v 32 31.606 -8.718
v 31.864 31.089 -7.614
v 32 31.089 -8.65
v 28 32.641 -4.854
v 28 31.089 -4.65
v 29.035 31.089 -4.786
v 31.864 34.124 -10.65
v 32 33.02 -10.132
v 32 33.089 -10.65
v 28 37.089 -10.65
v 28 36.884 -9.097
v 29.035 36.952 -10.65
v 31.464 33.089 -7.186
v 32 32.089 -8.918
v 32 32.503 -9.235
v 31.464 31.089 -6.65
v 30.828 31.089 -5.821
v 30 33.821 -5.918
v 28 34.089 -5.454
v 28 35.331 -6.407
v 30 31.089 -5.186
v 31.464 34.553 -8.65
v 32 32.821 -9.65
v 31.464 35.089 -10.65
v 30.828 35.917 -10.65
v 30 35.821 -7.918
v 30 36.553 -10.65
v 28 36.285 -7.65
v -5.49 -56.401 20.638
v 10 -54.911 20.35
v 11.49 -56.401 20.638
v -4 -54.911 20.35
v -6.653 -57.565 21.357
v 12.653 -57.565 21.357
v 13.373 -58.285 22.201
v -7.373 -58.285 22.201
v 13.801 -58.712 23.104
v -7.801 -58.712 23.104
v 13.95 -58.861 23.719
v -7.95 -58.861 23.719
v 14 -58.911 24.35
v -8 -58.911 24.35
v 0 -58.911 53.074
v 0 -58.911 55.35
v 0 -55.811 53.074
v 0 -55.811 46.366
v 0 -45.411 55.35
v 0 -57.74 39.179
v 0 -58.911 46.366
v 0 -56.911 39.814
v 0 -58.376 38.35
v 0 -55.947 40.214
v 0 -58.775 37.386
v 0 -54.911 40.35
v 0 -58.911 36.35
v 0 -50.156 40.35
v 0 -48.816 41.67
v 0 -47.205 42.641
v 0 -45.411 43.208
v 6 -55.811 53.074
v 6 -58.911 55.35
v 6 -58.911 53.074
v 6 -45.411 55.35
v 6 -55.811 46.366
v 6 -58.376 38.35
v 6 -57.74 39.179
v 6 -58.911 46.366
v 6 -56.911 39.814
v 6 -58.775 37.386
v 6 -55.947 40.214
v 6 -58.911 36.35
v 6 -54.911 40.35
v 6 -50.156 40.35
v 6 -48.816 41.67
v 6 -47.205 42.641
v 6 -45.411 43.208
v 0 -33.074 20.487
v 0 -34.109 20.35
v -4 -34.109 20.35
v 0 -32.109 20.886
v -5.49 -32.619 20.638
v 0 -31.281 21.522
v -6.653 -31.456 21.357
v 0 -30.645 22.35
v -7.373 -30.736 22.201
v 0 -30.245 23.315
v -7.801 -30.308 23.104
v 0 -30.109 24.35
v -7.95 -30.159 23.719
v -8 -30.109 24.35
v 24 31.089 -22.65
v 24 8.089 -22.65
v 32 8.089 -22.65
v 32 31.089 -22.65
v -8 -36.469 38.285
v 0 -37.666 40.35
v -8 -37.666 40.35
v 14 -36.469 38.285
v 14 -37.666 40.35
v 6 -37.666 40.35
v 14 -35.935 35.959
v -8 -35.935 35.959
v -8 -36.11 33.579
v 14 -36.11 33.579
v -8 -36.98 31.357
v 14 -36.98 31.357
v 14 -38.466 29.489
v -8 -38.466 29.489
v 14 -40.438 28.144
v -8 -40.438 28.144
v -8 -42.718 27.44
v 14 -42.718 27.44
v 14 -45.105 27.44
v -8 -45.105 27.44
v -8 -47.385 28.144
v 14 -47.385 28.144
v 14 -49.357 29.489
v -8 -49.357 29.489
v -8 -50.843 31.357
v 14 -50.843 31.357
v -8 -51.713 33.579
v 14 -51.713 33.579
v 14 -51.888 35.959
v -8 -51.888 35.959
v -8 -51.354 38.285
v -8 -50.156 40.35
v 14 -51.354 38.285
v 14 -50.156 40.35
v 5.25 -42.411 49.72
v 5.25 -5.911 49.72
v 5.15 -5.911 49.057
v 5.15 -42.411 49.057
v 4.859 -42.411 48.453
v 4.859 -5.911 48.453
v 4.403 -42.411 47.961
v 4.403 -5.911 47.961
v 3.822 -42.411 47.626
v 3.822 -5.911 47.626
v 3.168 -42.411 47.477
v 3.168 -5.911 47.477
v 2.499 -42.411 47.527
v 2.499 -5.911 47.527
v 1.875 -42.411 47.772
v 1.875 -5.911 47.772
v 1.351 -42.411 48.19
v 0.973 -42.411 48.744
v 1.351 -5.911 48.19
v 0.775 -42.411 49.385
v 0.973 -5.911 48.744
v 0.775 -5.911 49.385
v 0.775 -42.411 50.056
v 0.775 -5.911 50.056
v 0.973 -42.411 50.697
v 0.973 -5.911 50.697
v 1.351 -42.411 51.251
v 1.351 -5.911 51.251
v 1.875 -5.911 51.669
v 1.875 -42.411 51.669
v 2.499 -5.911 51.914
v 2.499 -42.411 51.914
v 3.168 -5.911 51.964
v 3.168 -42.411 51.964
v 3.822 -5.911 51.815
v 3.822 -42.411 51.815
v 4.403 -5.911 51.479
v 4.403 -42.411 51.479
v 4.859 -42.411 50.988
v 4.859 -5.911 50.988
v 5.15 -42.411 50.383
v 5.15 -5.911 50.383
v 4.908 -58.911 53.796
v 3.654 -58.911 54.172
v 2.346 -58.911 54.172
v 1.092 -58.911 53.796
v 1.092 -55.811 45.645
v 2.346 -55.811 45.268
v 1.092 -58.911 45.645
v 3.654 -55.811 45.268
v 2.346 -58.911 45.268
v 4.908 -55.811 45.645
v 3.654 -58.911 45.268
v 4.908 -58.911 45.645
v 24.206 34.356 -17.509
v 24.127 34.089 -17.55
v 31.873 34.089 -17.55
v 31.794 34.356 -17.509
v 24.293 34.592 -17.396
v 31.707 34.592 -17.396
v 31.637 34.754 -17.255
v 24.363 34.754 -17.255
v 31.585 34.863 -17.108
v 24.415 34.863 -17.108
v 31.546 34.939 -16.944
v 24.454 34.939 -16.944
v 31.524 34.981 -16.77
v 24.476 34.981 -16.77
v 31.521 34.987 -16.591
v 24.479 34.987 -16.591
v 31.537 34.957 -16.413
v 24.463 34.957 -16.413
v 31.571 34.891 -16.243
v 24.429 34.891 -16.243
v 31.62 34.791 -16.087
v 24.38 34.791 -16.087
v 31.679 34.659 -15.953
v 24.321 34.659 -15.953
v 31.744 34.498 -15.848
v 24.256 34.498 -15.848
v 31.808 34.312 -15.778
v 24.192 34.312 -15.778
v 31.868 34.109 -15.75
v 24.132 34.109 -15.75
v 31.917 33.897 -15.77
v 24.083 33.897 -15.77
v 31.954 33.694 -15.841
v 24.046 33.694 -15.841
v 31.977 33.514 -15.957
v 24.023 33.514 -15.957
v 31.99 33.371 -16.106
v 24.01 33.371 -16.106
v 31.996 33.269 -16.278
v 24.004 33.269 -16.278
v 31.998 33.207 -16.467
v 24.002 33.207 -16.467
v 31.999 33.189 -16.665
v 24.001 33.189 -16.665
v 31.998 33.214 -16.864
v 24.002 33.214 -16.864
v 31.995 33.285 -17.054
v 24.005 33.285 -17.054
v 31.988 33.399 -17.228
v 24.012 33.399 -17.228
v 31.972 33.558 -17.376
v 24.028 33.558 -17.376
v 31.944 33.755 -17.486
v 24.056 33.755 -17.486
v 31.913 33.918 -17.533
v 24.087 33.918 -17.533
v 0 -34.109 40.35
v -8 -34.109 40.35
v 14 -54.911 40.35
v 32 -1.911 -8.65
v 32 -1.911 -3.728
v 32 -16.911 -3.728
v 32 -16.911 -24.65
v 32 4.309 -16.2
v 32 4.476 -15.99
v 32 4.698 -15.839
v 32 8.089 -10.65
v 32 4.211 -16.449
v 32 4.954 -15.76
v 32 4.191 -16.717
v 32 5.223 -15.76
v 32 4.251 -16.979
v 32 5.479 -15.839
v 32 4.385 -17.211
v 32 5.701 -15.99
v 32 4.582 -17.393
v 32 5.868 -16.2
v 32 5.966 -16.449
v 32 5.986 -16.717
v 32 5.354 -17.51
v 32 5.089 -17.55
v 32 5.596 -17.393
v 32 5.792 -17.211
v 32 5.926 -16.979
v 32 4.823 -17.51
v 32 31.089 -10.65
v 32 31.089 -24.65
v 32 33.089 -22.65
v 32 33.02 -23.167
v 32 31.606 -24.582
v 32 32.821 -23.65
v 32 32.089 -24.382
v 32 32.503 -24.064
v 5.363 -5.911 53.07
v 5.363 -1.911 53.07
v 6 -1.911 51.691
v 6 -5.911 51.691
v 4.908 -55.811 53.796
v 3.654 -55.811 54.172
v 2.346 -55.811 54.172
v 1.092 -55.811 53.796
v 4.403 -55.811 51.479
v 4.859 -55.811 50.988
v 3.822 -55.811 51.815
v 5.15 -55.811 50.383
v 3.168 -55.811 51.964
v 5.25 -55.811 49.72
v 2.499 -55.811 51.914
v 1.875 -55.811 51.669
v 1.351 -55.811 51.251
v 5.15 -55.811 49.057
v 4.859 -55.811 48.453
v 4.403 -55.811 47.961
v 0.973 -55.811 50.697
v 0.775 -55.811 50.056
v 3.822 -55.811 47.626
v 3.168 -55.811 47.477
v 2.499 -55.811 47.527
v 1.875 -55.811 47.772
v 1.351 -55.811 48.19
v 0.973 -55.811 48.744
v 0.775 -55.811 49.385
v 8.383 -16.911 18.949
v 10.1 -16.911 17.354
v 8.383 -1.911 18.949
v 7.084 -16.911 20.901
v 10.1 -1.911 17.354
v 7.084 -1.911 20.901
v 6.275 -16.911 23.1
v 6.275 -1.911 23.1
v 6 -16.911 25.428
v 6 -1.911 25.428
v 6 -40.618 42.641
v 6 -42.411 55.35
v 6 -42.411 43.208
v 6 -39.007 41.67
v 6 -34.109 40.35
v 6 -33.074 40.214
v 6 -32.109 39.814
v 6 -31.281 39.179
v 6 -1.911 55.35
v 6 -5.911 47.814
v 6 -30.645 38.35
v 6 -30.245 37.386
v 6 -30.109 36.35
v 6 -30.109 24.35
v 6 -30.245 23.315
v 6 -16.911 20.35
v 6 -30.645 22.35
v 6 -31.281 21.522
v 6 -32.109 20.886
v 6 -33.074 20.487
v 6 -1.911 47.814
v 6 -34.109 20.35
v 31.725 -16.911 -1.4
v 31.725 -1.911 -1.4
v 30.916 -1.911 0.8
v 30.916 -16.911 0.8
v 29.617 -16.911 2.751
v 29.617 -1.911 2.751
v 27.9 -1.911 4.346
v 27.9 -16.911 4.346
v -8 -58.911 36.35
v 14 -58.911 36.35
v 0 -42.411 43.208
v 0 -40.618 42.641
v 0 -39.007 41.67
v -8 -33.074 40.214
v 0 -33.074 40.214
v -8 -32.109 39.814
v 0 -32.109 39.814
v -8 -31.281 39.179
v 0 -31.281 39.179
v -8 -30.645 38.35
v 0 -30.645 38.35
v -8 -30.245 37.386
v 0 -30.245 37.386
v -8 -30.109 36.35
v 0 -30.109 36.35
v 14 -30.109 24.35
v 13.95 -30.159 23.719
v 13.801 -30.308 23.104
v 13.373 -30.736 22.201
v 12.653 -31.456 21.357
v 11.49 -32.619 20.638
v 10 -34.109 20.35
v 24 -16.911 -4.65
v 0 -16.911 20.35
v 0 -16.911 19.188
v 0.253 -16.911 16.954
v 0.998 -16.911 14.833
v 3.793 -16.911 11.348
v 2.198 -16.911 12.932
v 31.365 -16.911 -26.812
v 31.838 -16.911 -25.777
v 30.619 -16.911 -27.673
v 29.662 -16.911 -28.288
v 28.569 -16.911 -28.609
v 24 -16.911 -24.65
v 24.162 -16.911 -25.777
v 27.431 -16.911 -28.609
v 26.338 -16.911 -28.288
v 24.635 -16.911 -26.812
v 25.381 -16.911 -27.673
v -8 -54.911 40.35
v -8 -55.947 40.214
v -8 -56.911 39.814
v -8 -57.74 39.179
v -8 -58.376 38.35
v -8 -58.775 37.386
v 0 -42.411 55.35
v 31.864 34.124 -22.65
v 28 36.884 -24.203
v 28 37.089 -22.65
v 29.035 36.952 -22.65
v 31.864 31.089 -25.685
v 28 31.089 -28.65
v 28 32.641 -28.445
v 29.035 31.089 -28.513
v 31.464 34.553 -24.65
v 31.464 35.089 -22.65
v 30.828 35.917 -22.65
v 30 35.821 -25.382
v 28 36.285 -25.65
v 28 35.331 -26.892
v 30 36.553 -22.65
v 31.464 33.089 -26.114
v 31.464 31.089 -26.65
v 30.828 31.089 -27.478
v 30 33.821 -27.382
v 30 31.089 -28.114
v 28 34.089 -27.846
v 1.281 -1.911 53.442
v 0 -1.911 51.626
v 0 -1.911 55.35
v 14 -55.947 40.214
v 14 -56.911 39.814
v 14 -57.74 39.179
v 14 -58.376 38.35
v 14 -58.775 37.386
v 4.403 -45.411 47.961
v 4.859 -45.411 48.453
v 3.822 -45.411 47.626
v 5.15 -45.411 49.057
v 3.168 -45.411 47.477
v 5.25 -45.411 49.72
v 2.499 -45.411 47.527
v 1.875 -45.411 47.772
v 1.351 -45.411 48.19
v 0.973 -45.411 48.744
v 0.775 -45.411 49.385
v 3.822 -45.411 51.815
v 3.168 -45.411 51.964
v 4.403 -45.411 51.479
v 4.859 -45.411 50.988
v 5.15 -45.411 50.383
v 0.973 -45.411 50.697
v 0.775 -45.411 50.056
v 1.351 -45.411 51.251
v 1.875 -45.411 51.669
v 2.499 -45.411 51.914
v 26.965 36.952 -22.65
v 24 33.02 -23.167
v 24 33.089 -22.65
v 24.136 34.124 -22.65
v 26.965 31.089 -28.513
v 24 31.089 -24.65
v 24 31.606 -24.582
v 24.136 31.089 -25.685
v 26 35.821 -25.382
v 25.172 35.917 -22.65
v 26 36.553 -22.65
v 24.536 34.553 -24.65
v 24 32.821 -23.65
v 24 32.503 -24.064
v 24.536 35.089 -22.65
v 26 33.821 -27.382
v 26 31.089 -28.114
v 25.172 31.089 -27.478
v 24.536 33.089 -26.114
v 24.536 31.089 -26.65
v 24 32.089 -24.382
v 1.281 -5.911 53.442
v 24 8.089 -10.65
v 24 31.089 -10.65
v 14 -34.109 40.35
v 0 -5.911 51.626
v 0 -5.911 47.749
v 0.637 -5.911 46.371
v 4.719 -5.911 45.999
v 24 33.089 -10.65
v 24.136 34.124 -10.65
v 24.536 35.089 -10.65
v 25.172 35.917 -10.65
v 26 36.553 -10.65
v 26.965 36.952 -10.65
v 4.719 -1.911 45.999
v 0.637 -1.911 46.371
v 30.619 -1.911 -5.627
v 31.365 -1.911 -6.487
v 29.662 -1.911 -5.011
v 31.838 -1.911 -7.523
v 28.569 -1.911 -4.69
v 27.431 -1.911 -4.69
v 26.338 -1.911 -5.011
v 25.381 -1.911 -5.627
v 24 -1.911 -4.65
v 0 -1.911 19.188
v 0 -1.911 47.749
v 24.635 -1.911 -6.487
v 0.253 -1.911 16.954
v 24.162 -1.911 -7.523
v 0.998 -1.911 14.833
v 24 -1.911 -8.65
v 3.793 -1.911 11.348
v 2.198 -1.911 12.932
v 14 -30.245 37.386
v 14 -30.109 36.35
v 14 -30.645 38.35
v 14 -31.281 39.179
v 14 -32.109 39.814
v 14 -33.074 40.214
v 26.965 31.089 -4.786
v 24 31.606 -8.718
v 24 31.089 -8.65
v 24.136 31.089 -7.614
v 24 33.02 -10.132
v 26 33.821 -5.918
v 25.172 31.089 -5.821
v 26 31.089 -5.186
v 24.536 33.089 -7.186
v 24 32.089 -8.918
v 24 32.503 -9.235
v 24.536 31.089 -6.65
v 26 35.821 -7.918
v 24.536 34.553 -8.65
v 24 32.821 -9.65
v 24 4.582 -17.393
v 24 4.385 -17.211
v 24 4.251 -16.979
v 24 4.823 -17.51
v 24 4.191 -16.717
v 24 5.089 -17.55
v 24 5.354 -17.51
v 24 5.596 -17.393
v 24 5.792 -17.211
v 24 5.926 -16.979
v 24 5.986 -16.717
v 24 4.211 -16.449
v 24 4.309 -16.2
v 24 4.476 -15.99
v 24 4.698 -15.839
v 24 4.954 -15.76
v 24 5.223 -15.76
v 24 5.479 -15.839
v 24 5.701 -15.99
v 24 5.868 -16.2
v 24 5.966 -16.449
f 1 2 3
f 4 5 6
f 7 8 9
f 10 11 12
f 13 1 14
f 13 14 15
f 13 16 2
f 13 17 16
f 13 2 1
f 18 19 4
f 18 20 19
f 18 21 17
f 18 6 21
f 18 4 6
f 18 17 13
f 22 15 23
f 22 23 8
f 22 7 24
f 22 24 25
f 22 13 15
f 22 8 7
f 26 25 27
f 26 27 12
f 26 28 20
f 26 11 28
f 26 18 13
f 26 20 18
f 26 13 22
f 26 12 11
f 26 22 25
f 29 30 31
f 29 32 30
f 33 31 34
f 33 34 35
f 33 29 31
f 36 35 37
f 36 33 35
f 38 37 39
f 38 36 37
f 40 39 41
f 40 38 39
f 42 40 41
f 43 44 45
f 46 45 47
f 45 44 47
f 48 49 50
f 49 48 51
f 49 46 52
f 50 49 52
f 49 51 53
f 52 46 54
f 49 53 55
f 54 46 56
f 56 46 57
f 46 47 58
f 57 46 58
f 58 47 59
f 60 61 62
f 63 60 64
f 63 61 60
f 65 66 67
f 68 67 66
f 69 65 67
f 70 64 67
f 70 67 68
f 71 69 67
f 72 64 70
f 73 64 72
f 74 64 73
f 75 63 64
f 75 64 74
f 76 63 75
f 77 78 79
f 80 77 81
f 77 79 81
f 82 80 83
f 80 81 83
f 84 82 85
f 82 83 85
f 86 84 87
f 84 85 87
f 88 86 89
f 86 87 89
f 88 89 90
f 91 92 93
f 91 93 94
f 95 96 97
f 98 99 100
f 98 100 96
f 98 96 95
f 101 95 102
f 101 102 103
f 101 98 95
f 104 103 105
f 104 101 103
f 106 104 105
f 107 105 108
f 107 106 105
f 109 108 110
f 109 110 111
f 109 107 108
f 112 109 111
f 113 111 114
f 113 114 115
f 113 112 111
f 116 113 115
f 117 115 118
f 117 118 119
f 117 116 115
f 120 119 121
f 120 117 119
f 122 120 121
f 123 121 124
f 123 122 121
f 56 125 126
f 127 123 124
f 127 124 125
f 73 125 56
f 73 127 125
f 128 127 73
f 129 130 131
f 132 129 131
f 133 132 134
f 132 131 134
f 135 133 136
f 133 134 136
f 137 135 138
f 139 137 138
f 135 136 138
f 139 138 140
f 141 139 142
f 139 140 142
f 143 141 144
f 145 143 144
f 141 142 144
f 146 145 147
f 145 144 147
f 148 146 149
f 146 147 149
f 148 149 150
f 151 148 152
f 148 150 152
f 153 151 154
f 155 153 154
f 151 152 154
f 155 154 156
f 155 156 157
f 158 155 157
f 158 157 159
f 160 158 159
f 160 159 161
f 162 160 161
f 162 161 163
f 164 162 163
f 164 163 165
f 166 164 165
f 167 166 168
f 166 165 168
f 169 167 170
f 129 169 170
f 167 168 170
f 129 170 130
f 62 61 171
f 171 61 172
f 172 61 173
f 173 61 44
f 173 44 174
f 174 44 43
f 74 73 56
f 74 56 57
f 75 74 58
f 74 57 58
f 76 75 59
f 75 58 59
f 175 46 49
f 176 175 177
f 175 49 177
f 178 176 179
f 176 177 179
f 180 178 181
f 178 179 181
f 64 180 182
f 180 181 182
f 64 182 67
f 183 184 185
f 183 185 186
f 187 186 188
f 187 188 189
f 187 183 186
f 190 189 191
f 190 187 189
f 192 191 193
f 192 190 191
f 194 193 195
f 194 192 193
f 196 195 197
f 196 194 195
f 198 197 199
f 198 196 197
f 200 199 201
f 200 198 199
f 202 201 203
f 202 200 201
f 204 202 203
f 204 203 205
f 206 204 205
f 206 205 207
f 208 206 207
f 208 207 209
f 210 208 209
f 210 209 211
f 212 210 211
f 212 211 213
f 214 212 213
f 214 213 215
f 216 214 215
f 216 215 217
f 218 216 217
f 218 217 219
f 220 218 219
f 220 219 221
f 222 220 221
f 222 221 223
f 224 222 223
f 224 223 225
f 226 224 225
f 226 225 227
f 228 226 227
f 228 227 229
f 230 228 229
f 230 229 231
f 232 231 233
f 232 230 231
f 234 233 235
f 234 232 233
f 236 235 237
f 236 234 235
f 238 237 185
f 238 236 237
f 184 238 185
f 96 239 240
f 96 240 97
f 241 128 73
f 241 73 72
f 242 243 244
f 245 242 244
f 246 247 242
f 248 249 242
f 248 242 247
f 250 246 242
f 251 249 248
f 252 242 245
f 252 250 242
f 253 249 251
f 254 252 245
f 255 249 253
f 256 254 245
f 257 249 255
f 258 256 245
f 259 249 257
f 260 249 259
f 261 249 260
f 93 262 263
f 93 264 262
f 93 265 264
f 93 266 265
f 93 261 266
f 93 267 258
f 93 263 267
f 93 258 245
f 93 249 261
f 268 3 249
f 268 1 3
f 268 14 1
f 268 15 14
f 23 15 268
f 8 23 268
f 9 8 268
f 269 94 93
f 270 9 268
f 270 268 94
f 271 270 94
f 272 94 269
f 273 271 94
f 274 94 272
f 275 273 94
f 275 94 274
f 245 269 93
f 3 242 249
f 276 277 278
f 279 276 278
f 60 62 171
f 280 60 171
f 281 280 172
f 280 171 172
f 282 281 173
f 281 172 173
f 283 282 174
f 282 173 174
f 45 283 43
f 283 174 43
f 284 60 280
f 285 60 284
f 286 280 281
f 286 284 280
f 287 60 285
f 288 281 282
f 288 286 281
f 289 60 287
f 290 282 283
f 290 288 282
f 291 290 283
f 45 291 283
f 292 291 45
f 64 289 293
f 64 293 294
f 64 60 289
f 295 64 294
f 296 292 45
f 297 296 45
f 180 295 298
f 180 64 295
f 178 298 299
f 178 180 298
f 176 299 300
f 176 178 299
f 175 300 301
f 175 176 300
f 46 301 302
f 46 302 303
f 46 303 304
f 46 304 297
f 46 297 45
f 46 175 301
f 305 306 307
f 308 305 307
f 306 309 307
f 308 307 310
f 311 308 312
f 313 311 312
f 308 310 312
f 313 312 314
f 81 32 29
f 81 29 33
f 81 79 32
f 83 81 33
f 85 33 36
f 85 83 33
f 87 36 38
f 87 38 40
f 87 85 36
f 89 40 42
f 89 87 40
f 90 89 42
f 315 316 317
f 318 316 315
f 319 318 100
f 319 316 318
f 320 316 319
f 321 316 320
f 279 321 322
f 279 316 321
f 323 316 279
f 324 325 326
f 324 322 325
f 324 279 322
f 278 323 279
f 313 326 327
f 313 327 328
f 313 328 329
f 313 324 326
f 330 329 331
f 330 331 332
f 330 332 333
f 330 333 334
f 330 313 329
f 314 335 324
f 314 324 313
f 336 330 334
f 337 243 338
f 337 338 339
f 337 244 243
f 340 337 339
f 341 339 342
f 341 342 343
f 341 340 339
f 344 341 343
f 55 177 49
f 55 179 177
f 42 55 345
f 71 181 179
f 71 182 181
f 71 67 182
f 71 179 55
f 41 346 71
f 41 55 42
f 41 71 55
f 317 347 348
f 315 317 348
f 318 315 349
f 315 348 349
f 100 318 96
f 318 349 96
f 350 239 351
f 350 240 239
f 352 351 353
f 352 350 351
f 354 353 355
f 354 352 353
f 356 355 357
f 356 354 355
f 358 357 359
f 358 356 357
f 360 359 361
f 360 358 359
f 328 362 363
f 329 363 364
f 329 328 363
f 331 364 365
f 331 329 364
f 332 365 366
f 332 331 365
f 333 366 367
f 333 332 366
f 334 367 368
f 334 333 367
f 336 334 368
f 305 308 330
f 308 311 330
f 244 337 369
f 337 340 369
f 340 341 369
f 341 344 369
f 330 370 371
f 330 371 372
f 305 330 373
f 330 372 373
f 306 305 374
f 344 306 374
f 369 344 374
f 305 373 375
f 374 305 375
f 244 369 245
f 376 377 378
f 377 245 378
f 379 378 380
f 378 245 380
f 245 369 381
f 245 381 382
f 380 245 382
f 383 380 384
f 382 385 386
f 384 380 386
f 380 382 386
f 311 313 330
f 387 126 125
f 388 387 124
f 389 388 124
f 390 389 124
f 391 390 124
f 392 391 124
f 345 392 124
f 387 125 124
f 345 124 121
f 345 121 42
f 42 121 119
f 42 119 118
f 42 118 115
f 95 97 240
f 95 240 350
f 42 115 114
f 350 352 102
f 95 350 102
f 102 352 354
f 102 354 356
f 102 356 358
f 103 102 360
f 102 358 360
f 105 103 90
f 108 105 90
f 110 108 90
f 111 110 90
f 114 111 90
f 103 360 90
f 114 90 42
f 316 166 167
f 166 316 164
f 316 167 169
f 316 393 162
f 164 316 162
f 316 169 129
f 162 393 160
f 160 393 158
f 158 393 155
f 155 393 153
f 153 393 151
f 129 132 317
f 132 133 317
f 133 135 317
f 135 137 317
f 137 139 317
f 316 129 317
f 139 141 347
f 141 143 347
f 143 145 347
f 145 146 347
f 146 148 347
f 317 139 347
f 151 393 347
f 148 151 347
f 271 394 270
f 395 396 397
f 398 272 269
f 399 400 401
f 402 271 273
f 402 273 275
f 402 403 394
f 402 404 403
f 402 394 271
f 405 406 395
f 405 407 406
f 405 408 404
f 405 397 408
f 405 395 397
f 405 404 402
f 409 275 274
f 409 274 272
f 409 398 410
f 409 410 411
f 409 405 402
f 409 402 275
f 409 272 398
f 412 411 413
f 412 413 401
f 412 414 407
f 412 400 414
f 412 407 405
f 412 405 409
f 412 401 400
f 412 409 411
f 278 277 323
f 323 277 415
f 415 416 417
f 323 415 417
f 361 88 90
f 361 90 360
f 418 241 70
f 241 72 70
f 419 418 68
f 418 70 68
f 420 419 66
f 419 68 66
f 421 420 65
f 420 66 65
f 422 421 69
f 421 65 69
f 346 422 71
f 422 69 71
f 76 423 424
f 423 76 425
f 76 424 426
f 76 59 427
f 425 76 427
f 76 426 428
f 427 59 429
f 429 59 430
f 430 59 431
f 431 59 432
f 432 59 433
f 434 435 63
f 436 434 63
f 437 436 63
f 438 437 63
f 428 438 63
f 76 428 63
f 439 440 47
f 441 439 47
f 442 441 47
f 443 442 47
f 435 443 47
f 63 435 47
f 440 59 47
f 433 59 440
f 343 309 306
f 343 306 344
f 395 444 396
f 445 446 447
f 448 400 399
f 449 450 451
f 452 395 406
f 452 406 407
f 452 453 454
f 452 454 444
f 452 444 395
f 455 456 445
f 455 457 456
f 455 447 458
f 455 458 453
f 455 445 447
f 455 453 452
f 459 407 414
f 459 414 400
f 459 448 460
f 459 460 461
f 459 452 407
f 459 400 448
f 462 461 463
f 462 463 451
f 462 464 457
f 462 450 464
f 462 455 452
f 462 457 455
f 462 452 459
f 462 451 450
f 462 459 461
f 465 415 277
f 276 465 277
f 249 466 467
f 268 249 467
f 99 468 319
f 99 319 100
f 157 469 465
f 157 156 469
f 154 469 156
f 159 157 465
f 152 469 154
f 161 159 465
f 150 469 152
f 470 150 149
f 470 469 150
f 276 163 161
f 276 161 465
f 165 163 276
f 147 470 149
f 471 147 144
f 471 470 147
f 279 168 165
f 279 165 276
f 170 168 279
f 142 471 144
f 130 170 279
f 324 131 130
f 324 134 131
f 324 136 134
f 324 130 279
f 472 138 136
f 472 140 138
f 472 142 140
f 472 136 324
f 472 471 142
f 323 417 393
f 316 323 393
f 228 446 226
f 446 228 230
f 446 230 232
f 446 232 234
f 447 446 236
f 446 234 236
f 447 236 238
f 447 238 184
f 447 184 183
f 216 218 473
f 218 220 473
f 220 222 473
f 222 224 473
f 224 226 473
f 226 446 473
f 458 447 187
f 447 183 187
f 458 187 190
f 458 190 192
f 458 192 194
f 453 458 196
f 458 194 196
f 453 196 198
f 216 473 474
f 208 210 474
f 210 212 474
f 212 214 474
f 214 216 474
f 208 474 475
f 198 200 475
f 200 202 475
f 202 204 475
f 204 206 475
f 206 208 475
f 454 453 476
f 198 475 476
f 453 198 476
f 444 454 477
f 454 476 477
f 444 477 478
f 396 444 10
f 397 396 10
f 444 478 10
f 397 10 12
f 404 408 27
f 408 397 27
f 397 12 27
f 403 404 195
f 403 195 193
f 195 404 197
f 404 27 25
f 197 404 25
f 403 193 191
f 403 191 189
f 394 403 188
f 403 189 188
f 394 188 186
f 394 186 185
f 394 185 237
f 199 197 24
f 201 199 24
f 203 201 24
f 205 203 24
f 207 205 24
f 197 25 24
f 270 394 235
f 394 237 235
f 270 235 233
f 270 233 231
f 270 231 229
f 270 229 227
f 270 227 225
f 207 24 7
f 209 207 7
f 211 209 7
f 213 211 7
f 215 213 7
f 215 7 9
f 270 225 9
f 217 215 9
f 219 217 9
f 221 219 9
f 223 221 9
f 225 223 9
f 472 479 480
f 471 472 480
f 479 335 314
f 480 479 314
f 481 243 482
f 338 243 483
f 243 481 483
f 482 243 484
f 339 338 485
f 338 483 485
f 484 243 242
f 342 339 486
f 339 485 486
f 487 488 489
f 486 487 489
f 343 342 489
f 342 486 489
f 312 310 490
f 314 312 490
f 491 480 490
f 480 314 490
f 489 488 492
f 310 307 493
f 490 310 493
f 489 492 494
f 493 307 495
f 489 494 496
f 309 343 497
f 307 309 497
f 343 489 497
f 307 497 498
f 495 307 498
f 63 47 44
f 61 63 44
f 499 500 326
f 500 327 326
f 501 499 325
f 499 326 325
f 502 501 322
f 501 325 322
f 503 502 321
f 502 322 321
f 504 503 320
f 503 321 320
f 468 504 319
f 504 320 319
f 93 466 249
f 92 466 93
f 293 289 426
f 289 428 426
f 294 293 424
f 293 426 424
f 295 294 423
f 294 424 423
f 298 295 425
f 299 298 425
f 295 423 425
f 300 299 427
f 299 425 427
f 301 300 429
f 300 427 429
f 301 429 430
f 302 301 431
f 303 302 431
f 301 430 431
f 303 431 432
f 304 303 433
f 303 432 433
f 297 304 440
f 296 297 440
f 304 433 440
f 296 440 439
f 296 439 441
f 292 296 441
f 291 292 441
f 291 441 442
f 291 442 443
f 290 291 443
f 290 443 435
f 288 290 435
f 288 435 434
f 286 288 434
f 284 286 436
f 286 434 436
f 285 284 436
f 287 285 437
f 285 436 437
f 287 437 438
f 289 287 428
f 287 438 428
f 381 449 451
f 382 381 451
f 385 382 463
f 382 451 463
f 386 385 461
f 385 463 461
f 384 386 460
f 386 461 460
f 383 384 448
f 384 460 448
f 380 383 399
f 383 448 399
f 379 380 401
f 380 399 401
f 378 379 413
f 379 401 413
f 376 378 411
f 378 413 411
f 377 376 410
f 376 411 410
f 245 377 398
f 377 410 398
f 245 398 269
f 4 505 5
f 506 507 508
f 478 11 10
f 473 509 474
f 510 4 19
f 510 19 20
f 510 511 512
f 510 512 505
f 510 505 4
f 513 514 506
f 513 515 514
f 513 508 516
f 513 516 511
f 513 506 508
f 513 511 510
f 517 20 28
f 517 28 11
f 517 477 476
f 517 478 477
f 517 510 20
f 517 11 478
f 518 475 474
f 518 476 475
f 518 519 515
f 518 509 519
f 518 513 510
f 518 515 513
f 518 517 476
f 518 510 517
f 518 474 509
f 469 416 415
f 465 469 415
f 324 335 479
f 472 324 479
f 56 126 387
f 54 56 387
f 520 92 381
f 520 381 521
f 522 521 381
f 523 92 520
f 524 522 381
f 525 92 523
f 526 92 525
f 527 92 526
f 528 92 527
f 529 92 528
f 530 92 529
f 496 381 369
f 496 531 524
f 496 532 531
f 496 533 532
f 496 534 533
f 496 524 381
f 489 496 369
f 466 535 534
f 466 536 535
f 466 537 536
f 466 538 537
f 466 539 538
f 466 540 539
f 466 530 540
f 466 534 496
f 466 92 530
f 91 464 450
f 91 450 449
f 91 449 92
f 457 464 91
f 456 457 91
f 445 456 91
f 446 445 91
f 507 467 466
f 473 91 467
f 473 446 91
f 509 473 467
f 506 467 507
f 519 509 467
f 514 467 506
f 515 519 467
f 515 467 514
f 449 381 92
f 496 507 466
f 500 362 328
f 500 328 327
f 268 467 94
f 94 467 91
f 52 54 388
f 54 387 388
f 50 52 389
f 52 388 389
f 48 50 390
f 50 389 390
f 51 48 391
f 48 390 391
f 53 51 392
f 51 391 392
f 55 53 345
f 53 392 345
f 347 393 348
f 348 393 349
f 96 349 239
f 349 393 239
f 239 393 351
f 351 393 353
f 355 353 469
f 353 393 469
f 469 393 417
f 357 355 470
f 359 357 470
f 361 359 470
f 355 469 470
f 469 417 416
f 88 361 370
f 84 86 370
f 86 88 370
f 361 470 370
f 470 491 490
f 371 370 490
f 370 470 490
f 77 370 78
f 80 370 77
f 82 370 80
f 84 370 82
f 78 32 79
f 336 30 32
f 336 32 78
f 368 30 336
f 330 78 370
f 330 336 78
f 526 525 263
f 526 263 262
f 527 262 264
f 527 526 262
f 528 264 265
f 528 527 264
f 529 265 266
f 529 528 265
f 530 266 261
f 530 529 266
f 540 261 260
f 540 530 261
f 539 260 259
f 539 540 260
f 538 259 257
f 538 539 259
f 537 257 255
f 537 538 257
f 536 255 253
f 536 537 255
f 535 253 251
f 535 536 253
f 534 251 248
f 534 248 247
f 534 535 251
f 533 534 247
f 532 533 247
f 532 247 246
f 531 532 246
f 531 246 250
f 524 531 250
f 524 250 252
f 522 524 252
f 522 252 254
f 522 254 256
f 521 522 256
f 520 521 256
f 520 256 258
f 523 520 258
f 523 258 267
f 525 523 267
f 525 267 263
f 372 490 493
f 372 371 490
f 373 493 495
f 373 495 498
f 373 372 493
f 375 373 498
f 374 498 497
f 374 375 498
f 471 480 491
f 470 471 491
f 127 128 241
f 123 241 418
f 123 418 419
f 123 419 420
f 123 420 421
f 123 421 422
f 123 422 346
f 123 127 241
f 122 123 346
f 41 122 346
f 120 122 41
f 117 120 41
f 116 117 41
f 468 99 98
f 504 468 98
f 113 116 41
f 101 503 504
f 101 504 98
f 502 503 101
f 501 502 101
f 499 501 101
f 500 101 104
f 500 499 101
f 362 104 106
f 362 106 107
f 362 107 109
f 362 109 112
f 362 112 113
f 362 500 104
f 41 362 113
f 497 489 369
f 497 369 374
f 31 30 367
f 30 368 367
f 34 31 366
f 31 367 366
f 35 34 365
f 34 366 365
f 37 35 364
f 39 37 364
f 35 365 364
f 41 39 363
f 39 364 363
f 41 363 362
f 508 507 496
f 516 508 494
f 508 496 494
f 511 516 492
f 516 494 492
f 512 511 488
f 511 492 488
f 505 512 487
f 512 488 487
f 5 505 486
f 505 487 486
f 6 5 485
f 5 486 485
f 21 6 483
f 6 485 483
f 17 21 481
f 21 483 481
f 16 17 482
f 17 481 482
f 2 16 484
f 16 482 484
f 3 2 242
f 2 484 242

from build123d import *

# Parameters (mm, degrees)
SKETCH1_R                                        = 0.9
SKETCH1_W                                        = 12
SKETCH1_H                                        = 23
BOSS_EXTRUDE1_DEPTH                              = 32
CBORE_FOR_M4_PAN_HEAD_MACHINE_SCREW2_D           = 4.5
CBORE_FOR_M4_PAN_HEAD_MACHINE_SCREW2_CBORE_D     = 9
CBORE_FOR_M4_PAN_HEAD_MACHINE_SCREW2_CBORE_DEPTH = 3.1
CUT_EXTRUDE2_DEPTH                               = 4
SKETCH9_W                                        = 35
SKETCH9_H                                        = 57
CUT_EXTRUDE3_DEPTH                               = 26
SKETCH10_W                                       = 24
SKETCH10_H                                       = 54
CUT_EXTRUDE4_DEPTH                               = 24
BOSS_EXTRUDE2_DEPTH                              = 8
BOSS_EXTRUDE2_DEPTH_BACK                         = 14
FILLET3_R                                        = 4
FILLET4_R                                        = 6
FILLET5_R                                        = 4
CUT_EXTRUDE5_DEPTH                               = 86.654277555
FILLET6_R                                        = 10


with BuildPart() as part:
    # Sketch1 → Boss-Extrude1 (new body)
    with BuildSketch(Plane(origin=(0, 0, 0), x_dir=(0, 0, -1), z_dir=(1, 0, 0))):
        with BuildLine():
            Line((-55.350295908, -42.411439664), (-43.208412731, -42.411439664))
            ThreePointArc((-43.208412731, -42.411439664), (-27.350295908, -43.911439664), (-43.208412731, -45.411439664))
            Line((-43.208412731, -45.411439664), (-55.350295908, -45.411439664))
            Line((-55.350295908, -45.411439664), (-55.350295908, -58.911439664))
            Line((-55.350295908, -58.911439664), (-20.350295908, -58.911439664))
            Line((-20.350295908, -58.911439664), (-20.350295908, -16.911439664))
            Line((-20.350295908, -16.911439664), (28.649704092, -16.911439664))
            Line((28.649704092, -16.911439664), (28.649704092, 37.088560336))
            Line((28.649704092, 37.088560336), (4.649704092, 37.088560336))
            Line((4.649704092, 37.088560336), (4.649704092, -1.911439664))
            Line((4.649704092, -1.911439664), (-55.350295908, -1.911439664))
            Line((-55.350295908, -1.911439664), (-55.350295908, -28.911439664))
            Line((-55.350295908, -28.911439664), (-55.350295908, -42.411439664))
        make_face()
        with Locations((16.649704092, 34.088560336)):
            Circle(SKETCH1_R, mode=Mode.SUBTRACT)
        with Locations((16.649704092, 5.088560336)):
            Circle(SKETCH1_R, mode=Mode.SUBTRACT)
        with Locations((16.649704092, 19.588560336)):
            Rectangle(SKETCH1_W, SKETCH1_H, mode=Mode.SUBTRACT)
    extrude(amount=BOSS_EXTRUDE1_DEPTH)

    # CBORE for M4 Pan Head Machine Screw2 (through all)
    with Locations(Plane(origin=(0, -58.911439664, 0), x_dir=(-1, 0, 0), z_dir=(0, -1, 0))):
        with Locations((-3, -49.720295908)):
            CounterBoreHole(CBORE_FOR_M4_PAN_HEAD_MACHINE_SCREW2_D / 2, CBORE_FOR_M4_PAN_HEAD_MACHINE_SCREW2_CBORE_D / 2, CBORE_FOR_M4_PAN_HEAD_MACHINE_SCREW2_CBORE_DEPTH)

    # Sketch7 → Cut-Extrude2 (cut)
    with BuildSketch(Plane(origin=(0, -1.911439664, 0), x_dir=(1, 0, 0), z_dir=(0, 1, 0))):
        Polygon((7.082253493, -49.348086624), (4.718784051, -45.998856036), (0.636530558, -46.37106532), (-1.082253493, -50.092505192), (1.281215949, -53.441735779), (5.363469442, -53.069526496), align=None)
    extrude(amount=-CUT_EXTRUDE2_DEPTH, mode=Mode.SUBTRACT)

    # Sketch9 → Cut-Extrude3 (cut)
    with BuildSketch(Plane(origin=(32, 0, 0), x_dir=(0, 0, -1), z_dir=(1, 0, 0))):
        with Locations((-37.850295908, -30.411439664)):
            Rectangle(SKETCH9_W, SKETCH9_H)
    extrude(amount=-CUT_EXTRUDE3_DEPTH, mode=Mode.SUBTRACT)

    # Sketch10 → Cut-Extrude4 (cut)
    with BuildSketch(Plane.ZY):
        with Locations((-16.649704092, 10.088560336)):
            Rectangle(SKETCH10_W, SKETCH10_H)
    extrude(amount=-CUT_EXTRUDE4_DEPTH, mode=Mode.SUBTRACT)

    # Sketch11 → Boss-Extrude2 (add, two sides: drawn at the far end of the back side and taken through both)
    with BuildSketch(Plane.ZY.offset(-BOSS_EXTRUDE2_DEPTH_BACK)):
        with BuildLine():
            Line((20.350295908, -30.109144798), (40.350295908, -30.109144798))
            Line((40.350295908, -30.109144798), (40.350295908, -37.666441665))
            ThreePointArc((40.350295908, -37.666441665), (27.350295908, -43.911439664), (40.350295908, -50.156437662))
            Line((40.350295908, -50.156437662), (40.350295908, -58.911439664))
            Line((40.350295908, -58.911439664), (20.350295908, -58.911439664))
            Line((20.350295908, -58.911439664), (20.350295908, -30.109144798))
        make_face()
    extrude(amount=BOSS_EXTRUDE2_DEPTH + BOSS_EXTRUDE2_DEPTH_BACK)

    # Fillet3
    fillet3_edges = [part.edges().sort_by_distance(p)[0] for p in [
        (3, -58.911439664, 20.350295908),
        (14, -44.510292231, 20.350295908),
        (-4, -30.109144798, 20.350295908),
        (10, -30.109144798, 20.350295908),
        (-4, -30.109144798, 40.350295908),
        (10, -30.109144798, 40.350295908),
        (-4, -58.911439664, 40.350295908),
        (10, -58.911439664, 40.350295908),
        (-8, -44.510292231, 20.350295908),
    ]]
    fillet(fillet3_edges, radius=FILLET3_R)

    # Fillet4
    fillet4_edges = [part.edges().sort_by_distance(p)[0] for p in [
        (28, 37.088560336, -4.649704092),
        (28, 37.088560336, -28.649704092),
    ]]
    fillet(fillet4_edges, radius=FILLET4_R)

    # Fillet5
    # the kernel refuses this fillet: 4 mm, written as the material it takes off along each edge
    with BuildSketch(Plane(origin=(32, 31.088560336, -4.649704092), x_dir=(-1, 0, 0), z_dir=(0, -1, 0)), Plane(origin=(24, -1.911439664, -4.649704092), x_dir=(1, 0, 0), z_dir=(0, 1, 0))) as fillet5_piece_1:
        with BuildLine():
            CenterArc((FILLET5_R, FILLET5_R), FILLET5_R, 180, 90)
            Line((0, FILLET5_R), (0, 0))
            Line((0, 0), (FILLET5_R, 0))
        make_face()
    extrude(amount=33, mode=Mode.SUBTRACT)
    with BuildSketch(Plane(origin=(32, 31.088560336, -10.649704092), x_dir=(0, 0, 1), z_dir=(0, -1, 0))) as fillet5_piece_2:
        with BuildLine():
            CenterArc((6 - FILLET5_R, FILLET5_R), FILLET5_R, 270, 90)
            Line((6 - FILLET5_R, 0), (6, 0))
            Line((6, 0), (6, FILLET5_R))
        make_face()
    revolve(axis=Axis((32, 31.088560336, -10.649704092), (-1, 0, 0)), revolution_arc=90, mode=Mode.SUBTRACT)
    with BuildSketch(Plane(origin=(32, 37.088560336, -22.649704092), x_dir=(0, -1, 0), z_dir=(0, 0, 1)), Plane(origin=(24, 37.088560336, -10.649704092), x_dir=(0, -1, 0), z_dir=(0, 0, -1))) as fillet5_piece_3:
        with BuildLine():
            CenterArc((FILLET5_R, -FILLET5_R), FILLET5_R, 90, 90)
            Line((0, -FILLET5_R), (0, 0))
            Line((0, 0), (FILLET5_R, 0))
        make_face()
    extrude(amount=12, mode=Mode.SUBTRACT)
    with BuildSketch(Plane(origin=(32, 31.088560336, -22.649704092), x_dir=(0, 1, 0), z_dir=(0, 0, 1))) as fillet5_piece_4:
        with BuildLine():
            CenterArc((6 - FILLET5_R, FILLET5_R), FILLET5_R, 270, 90)
            Line((6, FILLET5_R), (6, 0))
            Line((6, 0), (6 - FILLET5_R, 0))
        make_face()
    revolve(axis=Axis((32, 31.088560336, -22.649704092), (-1, 0, 0)), revolution_arc=90, mode=Mode.SUBTRACT)
    with BuildSketch(Plane(origin=(24, 31.088560336, -10.649704092), x_dir=(0, 0, 1), z_dir=(0, -1, 0))) as fillet5_piece_5:
        with BuildLine():
            CenterArc((6 - FILLET5_R, -FILLET5_R), FILLET5_R, 0, 90)
            Line((6, -FILLET5_R), (6, 0))
            Line((6, 0), (6 - FILLET5_R, 0))
        make_face()
    revolve(axis=Axis((24, 31.088560336, -10.649704092), (-1, 0, 0)), revolution_arc=90, mode=Mode.SUBTRACT)
    with BuildSketch(Plane(origin=(24, 31.088560336, -22.649704092), x_dir=(0, 1, 0), z_dir=(0, 0, 1))) as fillet5_piece_6:
        with BuildLine():
            CenterArc((6 - FILLET5_R, -FILLET5_R), FILLET5_R, 0, 90)
            Line((6, -FILLET5_R), (6, 0))
            Line((6, 0), (6 - FILLET5_R, 0))
        make_face()
    revolve(axis=Axis((24, 31.088560336, -22.649704092), (-1, 0, 0)), revolution_arc=90, mode=Mode.SUBTRACT)
    with BuildSketch(Plane(origin=(32, -26.911439664, -28.649704092), x_dir=(0, 0, 1), z_dir=(0, 1, 0)), Plane(origin=(24, 31.088560336, -28.649704092), x_dir=(0, 0, 1), z_dir=(0, -1, 0))) as fillet5_piece_7:
        with BuildLine():
            CenterArc((FILLET5_R, -FILLET5_R), FILLET5_R, 90, 90)
            Line((0, -FILLET5_R), (0, 0))
            Line((0, 0), (FILLET5_R, 0))
        make_face()
    extrude(amount=58, mode=Mode.SUBTRACT)

    # Sketch13 → Cut-Extrude5 (cut, through all)
    with BuildSketch(Plane(origin=(0, -1.911439664, 0), x_dir=(1, 0, 0), z_dir=(0, 1, 0))):
        Polygon((6, -20.350295908), (32, -1.350295908), (32, -20.350295908), align=None)
        Polygon((0, 4.649704092), (24, 4.649704092), (0, -14.350295908), align=None)
    extrude(amount=-CUT_EXTRUDE5_DEPTH, mode=Mode.SUBTRACT)

    # Fillet6
    fillet6_edges = [part.edges().sort_by_distance(p)[0] for p in [
        (6, -9.411439664, 20.350295908),
        (32, -9.411439664, 1.350295908),
        (0, -9.411439664, 14.350295908),
    ]]
    fillet(fillet6_edges, radius=FILLET6_R)


solid = part.part
